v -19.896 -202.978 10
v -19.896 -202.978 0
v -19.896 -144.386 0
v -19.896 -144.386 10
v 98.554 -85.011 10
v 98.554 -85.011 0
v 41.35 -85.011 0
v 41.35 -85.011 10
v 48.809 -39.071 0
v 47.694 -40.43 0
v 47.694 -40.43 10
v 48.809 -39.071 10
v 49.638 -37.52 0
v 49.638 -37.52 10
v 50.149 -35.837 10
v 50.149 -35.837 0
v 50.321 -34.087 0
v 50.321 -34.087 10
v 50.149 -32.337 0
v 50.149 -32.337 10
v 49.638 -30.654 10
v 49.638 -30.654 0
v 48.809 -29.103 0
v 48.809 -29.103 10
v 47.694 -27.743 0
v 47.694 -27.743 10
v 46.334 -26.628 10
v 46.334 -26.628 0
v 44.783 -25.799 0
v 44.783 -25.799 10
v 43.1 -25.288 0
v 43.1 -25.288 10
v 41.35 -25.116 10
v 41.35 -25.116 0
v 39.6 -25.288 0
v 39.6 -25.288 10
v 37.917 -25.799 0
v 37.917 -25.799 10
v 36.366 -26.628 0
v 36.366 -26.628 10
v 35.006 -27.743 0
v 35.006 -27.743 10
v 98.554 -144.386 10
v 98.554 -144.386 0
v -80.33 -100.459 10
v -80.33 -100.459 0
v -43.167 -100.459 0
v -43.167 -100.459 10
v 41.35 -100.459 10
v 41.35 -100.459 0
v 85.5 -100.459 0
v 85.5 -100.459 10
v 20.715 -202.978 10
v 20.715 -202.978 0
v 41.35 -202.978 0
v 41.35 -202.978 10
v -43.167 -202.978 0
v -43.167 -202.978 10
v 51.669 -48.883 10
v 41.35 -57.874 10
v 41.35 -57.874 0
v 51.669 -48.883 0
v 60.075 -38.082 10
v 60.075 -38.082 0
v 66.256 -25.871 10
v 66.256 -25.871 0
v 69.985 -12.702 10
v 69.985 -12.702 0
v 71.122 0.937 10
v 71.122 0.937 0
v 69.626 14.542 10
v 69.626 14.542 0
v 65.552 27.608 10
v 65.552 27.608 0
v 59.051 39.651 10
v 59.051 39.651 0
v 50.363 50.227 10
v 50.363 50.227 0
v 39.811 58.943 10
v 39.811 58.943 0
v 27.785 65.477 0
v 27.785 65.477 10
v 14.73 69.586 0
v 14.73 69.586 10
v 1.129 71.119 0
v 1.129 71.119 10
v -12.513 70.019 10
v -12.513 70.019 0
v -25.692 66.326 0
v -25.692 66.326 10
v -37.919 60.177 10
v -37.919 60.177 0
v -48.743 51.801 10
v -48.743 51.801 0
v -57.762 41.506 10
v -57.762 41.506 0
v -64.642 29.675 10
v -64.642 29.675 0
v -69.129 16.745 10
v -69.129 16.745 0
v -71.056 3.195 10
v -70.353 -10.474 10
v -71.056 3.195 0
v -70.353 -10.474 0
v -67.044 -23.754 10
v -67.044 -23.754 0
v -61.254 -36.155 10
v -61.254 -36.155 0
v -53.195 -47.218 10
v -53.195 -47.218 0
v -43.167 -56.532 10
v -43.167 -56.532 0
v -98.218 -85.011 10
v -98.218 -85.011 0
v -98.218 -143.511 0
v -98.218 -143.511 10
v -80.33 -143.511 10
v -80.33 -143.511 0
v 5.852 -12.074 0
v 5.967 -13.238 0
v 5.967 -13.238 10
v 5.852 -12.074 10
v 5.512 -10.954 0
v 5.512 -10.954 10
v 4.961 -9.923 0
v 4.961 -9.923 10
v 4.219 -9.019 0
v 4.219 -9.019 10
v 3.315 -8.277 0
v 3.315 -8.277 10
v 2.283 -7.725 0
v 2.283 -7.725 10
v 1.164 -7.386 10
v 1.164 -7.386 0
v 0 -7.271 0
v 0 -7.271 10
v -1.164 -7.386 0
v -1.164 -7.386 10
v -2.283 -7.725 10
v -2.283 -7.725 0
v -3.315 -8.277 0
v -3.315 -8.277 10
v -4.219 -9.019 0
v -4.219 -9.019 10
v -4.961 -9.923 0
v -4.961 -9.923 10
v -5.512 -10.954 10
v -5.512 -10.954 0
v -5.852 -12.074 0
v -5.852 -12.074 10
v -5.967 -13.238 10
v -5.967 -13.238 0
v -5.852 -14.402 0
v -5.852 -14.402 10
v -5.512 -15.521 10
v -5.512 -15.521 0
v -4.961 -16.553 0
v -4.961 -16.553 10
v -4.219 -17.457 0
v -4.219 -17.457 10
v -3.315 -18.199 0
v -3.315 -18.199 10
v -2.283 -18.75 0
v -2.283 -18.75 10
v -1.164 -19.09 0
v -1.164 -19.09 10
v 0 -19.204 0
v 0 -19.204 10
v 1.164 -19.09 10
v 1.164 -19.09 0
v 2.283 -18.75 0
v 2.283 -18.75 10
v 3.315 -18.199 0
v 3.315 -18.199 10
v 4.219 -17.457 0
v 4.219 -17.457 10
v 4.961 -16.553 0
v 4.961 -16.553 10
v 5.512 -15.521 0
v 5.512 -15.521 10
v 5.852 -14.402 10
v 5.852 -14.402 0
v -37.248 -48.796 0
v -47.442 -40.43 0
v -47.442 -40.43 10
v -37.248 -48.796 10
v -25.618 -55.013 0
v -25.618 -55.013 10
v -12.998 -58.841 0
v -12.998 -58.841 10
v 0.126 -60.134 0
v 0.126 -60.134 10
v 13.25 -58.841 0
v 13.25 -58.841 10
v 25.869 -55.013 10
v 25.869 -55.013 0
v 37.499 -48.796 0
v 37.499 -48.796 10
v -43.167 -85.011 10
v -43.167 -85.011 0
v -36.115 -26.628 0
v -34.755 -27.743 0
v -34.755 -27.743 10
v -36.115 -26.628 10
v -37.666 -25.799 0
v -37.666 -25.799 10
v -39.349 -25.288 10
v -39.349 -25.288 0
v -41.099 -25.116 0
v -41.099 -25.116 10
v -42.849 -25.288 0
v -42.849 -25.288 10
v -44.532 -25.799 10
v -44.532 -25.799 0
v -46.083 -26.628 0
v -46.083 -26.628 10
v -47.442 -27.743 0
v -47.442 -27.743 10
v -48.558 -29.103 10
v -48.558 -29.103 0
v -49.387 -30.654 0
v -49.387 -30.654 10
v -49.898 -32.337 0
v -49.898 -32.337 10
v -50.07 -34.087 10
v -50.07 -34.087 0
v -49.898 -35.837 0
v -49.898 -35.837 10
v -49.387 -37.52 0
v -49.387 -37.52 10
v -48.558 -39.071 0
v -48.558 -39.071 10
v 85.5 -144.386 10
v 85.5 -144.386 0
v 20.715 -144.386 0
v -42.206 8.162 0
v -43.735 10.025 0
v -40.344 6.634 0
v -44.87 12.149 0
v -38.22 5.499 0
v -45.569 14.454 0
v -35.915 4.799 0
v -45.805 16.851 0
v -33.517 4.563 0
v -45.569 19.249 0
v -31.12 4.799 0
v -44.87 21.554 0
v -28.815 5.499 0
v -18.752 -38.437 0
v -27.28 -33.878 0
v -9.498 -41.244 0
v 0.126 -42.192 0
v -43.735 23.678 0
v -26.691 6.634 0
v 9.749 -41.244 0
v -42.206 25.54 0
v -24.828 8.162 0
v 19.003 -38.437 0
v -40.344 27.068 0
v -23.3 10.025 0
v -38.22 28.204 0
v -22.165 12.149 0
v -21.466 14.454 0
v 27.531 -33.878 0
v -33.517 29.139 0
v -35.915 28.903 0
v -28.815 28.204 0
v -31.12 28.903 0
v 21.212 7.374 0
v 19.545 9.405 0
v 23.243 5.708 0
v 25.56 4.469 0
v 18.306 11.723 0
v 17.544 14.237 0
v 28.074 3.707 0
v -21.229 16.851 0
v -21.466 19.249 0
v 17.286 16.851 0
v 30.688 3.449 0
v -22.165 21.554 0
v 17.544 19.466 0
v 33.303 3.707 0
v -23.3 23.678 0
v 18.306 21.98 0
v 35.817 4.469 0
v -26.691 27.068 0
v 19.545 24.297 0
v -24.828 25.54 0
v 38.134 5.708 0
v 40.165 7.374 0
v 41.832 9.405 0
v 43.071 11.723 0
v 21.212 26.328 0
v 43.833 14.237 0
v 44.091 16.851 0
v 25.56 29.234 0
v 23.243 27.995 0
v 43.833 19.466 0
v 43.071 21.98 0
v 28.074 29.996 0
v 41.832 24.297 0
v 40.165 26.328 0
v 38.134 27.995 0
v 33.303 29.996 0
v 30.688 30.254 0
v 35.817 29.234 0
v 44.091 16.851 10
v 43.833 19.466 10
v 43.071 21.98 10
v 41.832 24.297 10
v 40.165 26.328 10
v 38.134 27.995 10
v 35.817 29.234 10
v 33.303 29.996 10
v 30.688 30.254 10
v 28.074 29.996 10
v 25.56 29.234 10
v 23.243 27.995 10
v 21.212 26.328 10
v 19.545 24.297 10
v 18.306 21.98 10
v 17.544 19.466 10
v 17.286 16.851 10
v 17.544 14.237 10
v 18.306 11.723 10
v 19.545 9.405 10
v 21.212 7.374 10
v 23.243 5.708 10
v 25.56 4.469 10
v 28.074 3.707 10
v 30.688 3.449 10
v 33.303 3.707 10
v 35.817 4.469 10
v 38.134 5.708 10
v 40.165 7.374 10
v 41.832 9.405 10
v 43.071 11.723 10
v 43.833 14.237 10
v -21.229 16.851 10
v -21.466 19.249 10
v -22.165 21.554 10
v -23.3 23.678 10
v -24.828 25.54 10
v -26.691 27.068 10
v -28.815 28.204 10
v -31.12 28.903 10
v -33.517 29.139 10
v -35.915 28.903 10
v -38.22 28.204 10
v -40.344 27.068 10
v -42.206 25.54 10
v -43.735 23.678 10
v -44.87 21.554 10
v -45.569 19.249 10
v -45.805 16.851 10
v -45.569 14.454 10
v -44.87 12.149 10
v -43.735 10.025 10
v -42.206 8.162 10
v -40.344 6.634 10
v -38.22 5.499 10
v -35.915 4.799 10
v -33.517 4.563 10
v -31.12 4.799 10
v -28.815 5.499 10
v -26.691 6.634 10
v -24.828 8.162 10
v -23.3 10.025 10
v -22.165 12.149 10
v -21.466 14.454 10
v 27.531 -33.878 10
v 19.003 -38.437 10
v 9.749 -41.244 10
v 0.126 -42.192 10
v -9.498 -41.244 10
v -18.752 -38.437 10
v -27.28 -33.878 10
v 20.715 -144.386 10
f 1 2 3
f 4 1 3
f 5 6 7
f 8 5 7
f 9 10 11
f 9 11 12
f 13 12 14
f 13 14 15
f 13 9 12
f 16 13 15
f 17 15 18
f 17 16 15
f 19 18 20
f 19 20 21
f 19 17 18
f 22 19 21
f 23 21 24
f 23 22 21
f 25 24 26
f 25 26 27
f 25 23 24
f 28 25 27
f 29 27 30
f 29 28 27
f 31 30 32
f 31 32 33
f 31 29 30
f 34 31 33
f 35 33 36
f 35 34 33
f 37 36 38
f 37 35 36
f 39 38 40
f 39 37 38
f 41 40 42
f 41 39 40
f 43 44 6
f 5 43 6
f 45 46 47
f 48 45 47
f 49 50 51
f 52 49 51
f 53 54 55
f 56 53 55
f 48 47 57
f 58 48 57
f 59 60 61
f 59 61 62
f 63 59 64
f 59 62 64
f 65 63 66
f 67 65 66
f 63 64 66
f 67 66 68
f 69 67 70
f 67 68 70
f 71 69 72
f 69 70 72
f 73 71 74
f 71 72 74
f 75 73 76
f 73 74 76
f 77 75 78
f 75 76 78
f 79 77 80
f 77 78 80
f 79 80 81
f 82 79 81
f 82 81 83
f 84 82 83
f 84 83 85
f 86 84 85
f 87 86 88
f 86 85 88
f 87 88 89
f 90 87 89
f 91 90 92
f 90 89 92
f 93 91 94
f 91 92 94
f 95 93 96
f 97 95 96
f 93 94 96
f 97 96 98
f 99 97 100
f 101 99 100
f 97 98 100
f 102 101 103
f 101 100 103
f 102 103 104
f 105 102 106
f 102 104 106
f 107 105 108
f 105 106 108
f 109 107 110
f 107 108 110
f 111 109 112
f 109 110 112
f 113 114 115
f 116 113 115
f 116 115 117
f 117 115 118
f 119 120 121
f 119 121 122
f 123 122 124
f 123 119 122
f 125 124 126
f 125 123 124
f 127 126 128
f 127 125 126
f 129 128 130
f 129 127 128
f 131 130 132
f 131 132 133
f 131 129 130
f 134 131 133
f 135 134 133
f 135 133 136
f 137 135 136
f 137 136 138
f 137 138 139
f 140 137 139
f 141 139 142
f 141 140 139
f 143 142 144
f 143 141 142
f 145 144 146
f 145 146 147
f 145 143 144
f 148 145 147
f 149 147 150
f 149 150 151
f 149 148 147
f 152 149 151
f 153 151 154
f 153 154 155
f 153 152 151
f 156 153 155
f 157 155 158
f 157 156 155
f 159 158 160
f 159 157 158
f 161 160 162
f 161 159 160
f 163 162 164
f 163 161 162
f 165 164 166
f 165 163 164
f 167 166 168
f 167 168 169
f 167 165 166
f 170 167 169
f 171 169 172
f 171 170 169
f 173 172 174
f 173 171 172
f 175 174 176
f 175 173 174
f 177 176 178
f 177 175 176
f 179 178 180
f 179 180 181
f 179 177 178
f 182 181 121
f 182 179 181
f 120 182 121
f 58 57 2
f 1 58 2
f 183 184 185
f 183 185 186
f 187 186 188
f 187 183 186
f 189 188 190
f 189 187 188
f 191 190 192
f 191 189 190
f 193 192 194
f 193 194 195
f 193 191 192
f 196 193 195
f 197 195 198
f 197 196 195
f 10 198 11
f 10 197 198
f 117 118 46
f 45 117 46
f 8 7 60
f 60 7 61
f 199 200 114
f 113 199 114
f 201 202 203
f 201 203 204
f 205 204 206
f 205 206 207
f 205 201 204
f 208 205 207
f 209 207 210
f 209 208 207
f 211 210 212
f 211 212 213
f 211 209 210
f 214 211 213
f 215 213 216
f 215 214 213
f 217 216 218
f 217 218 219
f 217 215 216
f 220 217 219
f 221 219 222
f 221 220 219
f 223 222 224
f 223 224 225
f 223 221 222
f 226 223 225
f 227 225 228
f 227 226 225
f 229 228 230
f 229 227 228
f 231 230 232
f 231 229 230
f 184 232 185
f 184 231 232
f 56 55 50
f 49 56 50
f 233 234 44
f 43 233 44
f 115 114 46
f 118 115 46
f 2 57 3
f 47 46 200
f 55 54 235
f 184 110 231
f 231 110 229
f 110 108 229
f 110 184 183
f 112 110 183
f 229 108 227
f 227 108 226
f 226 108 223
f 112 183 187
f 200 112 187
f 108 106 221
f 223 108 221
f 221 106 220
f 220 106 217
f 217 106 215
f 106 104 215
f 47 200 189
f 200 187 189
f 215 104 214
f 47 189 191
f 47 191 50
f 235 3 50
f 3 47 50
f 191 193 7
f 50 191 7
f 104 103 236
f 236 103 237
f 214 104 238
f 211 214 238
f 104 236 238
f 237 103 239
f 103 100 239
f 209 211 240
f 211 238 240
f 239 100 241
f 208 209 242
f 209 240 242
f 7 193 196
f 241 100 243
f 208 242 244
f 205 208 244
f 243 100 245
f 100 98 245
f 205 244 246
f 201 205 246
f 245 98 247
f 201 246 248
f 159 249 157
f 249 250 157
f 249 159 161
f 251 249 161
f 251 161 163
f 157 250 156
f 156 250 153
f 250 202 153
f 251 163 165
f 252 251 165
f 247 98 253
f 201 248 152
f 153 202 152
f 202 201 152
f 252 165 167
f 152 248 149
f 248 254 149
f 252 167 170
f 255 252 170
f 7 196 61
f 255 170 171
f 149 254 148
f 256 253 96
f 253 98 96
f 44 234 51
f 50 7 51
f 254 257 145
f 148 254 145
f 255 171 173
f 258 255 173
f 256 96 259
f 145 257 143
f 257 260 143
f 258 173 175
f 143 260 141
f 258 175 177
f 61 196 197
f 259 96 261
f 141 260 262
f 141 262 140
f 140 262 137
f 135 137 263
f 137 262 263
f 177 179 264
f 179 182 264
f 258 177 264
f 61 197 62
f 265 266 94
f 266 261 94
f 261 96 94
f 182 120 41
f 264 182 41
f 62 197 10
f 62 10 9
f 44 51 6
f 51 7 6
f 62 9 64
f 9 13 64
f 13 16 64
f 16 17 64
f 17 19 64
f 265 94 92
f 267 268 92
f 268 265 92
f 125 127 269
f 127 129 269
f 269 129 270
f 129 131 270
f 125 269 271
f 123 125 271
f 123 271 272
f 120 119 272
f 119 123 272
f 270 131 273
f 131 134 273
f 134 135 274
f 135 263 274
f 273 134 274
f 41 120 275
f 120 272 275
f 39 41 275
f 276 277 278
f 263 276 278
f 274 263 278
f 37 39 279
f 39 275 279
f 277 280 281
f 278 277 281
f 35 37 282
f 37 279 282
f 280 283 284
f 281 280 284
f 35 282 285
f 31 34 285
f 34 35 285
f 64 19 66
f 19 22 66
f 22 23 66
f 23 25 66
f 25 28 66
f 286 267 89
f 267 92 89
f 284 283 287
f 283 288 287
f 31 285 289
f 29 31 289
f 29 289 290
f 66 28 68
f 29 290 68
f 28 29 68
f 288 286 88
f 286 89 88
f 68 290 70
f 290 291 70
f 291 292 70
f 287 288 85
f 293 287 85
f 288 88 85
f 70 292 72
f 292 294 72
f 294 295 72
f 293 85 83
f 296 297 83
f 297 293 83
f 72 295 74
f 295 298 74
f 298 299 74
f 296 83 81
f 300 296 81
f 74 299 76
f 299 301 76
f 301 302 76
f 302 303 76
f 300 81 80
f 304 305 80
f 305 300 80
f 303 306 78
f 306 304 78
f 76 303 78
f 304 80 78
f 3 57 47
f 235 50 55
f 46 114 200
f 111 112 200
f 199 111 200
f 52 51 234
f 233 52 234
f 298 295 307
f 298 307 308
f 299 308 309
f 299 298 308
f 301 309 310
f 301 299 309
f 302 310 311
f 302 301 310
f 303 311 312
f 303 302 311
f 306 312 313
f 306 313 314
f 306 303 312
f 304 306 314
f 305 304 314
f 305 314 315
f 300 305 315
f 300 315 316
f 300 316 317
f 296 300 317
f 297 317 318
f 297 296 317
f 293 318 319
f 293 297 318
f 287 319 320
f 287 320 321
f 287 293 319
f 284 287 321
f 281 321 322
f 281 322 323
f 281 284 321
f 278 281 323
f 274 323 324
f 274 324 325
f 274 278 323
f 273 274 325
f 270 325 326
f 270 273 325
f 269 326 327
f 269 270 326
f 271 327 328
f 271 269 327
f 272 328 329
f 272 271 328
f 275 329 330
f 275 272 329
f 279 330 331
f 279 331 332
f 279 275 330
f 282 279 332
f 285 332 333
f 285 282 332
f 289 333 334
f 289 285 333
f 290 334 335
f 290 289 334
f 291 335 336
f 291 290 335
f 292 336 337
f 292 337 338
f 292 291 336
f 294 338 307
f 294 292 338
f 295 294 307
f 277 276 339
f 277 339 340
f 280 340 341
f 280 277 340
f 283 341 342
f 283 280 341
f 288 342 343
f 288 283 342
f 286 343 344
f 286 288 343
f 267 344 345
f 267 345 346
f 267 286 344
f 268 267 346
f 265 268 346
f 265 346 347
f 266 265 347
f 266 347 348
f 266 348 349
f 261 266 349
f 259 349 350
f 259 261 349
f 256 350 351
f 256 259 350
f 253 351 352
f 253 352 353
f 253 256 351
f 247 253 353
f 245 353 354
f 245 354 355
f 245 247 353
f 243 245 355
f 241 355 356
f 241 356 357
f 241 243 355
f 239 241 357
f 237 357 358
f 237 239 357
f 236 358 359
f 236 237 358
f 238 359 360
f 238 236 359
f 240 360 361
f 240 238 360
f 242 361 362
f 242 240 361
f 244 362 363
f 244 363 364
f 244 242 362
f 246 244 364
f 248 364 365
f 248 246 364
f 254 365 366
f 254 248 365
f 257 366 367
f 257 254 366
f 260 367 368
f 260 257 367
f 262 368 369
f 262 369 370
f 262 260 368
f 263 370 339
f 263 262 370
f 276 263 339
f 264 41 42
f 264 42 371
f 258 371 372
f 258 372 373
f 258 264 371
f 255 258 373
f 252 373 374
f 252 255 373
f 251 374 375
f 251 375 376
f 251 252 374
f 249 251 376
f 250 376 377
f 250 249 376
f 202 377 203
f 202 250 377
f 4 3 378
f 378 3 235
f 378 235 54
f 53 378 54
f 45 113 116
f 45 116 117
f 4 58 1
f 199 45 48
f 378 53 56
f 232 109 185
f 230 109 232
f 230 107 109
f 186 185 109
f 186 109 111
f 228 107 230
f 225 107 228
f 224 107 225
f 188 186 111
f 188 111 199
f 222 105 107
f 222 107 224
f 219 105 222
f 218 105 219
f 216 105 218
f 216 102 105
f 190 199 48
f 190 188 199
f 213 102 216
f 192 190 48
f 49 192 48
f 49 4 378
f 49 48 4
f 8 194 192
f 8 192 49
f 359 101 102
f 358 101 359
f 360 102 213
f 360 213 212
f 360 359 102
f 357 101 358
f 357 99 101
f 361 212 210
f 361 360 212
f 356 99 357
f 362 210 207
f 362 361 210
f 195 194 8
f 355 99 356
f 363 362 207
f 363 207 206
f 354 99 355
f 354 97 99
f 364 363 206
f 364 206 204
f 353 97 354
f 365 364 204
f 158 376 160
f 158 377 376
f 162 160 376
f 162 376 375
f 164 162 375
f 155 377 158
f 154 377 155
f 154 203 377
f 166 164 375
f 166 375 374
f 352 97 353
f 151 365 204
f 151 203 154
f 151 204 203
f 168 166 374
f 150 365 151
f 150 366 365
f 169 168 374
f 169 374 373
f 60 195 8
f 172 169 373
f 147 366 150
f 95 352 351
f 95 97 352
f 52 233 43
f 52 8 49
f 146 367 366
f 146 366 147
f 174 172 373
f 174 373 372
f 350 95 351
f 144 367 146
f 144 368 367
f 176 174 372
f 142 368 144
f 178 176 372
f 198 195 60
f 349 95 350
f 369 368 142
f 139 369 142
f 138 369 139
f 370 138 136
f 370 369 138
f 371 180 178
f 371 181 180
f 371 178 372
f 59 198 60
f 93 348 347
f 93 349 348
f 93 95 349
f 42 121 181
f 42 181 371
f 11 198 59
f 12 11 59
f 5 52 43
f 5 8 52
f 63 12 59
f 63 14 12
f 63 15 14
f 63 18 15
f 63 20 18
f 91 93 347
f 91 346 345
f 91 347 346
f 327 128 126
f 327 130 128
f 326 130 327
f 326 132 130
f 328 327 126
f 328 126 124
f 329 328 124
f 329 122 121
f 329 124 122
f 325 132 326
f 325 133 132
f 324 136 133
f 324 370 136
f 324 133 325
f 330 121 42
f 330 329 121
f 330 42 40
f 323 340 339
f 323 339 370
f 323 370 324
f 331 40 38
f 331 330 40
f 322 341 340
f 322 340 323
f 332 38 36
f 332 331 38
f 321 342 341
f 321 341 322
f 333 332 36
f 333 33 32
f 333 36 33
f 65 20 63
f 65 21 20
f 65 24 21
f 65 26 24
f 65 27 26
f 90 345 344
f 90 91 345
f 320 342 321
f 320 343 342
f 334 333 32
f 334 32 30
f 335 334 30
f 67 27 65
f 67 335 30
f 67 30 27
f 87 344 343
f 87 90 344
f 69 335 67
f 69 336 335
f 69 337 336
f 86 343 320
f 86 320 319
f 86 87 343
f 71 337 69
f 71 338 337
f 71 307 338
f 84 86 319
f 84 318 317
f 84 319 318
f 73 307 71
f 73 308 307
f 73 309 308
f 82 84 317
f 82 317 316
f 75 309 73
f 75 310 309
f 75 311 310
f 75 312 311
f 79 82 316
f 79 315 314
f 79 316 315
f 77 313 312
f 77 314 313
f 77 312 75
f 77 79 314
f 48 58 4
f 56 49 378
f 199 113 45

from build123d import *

# Parameters (mm, degrees)
SKETCH1_R           = 12.288018633
SKETCH1_R_2         = 13.402342443
SKETCH1_R_3         = 5.966655134
BOSS_EXTRUDE1_DEPTH = 10


with BuildPart() as part:
    # Sketch1 → Boss-Extrude1 (new body)
    with BuildSketch(Plane.XY):
        with BuildLine():
            Line((-43.16670826, -100.459006624), (-43.16670826, -144.386357681))
            Line((-43.16670826, -144.386357681), (-43.16670826, -202.977586365))
            Line((-43.16670826, -202.977586365), (-19.89608029, -202.977586365))
            Line((-19.89608029, -202.977586365), (-19.89608029, -144.386357681))
            Line((-19.89608029, -144.386357681), (20.715262102, -144.386357681))
            Line((20.715262102, -144.386357681), (20.715262102, -202.977586365))
            Line((20.715262102, -202.977586365), (41.349988273, -202.977586365))
            Line((41.349988273, -202.977586365), (41.349988273, -144.386357681))
            Line((41.349988273, -144.386357681), (41.349988273, -100.459006624))
            Line((41.349988273, -100.459006624), (85.500022586, -100.459006624))
            Line((85.500022586, -100.459006624), (85.500022586, -144.386357681))
            Line((85.500022586, -144.386357681), (98.553668355, -144.386357681))
            Line((98.553668355, -144.386357681), (98.553668355, -100.459006624))
            Line((98.553668355, -100.459006624), (98.553668355, -85.011306082))
            Line((98.553668355, -85.011306082), (41.349988273, -85.011306082))
            Line((41.349988273, -85.011306082), (41.349988273, -57.873752711))
            ThreePointArc((41.349988273, -57.873752711), (1.129346742, 71.119036544), (-43.16670826, -56.531655566))
            Line((-43.16670826, -56.531655566), (-43.16670826, -85.011306082))
            Line((-43.16670826, -85.011306082), (-98.217954904, -85.011306082))
            Line((-98.217954904, -85.011306082), (-98.217954904, -100.459006624))
            Line((-98.217954904, -100.459006624), (-98.217954904, -143.510977861))
            Line((-98.217954904, -143.510977861), (-80.329625517, -143.510977861))
            Line((-80.329625517, -143.510977861), (-80.329625517, -100.459006624))
            Line((-80.329625517, -100.459006624), (-43.16670826, -100.459006624))
        make_face()
        with Locations((-33.517420804, 16.851364033)):
            Circle(SKETCH1_R, mode=Mode.SUBTRACT)
        with Locations((30.688490145, 16.851364033)):
            Circle(SKETCH1_R_2, mode=Mode.SUBTRACT)
        with Locations((0, -13.237752907)):
            Circle(SKETCH1_R_3, mode=Mode.SUBTRACT)
        with BuildLine():
            ThreePointArc((-47.4424626, -40.430436817), (0.125528844, -60.133744008), (47.693520288, -40.430436817))
            ThreePointArc((47.693520288, -40.430436817), (47.693520288, -27.743372786), (35.006456257, -27.743372786))
            ThreePointArc((35.006456257, -27.743372786), (0.125528844, -42.191525989), (-34.755398569, -27.743372786))
            ThreePointArc((-34.755398569, -27.743372786), (-47.4424626, -27.743372786), (-47.4424626, -40.430436817))
        make_face(mode=Mode.SUBTRACT)
    extrude(amount=BOSS_EXTRUDE1_DEPTH)


solid = part.part
